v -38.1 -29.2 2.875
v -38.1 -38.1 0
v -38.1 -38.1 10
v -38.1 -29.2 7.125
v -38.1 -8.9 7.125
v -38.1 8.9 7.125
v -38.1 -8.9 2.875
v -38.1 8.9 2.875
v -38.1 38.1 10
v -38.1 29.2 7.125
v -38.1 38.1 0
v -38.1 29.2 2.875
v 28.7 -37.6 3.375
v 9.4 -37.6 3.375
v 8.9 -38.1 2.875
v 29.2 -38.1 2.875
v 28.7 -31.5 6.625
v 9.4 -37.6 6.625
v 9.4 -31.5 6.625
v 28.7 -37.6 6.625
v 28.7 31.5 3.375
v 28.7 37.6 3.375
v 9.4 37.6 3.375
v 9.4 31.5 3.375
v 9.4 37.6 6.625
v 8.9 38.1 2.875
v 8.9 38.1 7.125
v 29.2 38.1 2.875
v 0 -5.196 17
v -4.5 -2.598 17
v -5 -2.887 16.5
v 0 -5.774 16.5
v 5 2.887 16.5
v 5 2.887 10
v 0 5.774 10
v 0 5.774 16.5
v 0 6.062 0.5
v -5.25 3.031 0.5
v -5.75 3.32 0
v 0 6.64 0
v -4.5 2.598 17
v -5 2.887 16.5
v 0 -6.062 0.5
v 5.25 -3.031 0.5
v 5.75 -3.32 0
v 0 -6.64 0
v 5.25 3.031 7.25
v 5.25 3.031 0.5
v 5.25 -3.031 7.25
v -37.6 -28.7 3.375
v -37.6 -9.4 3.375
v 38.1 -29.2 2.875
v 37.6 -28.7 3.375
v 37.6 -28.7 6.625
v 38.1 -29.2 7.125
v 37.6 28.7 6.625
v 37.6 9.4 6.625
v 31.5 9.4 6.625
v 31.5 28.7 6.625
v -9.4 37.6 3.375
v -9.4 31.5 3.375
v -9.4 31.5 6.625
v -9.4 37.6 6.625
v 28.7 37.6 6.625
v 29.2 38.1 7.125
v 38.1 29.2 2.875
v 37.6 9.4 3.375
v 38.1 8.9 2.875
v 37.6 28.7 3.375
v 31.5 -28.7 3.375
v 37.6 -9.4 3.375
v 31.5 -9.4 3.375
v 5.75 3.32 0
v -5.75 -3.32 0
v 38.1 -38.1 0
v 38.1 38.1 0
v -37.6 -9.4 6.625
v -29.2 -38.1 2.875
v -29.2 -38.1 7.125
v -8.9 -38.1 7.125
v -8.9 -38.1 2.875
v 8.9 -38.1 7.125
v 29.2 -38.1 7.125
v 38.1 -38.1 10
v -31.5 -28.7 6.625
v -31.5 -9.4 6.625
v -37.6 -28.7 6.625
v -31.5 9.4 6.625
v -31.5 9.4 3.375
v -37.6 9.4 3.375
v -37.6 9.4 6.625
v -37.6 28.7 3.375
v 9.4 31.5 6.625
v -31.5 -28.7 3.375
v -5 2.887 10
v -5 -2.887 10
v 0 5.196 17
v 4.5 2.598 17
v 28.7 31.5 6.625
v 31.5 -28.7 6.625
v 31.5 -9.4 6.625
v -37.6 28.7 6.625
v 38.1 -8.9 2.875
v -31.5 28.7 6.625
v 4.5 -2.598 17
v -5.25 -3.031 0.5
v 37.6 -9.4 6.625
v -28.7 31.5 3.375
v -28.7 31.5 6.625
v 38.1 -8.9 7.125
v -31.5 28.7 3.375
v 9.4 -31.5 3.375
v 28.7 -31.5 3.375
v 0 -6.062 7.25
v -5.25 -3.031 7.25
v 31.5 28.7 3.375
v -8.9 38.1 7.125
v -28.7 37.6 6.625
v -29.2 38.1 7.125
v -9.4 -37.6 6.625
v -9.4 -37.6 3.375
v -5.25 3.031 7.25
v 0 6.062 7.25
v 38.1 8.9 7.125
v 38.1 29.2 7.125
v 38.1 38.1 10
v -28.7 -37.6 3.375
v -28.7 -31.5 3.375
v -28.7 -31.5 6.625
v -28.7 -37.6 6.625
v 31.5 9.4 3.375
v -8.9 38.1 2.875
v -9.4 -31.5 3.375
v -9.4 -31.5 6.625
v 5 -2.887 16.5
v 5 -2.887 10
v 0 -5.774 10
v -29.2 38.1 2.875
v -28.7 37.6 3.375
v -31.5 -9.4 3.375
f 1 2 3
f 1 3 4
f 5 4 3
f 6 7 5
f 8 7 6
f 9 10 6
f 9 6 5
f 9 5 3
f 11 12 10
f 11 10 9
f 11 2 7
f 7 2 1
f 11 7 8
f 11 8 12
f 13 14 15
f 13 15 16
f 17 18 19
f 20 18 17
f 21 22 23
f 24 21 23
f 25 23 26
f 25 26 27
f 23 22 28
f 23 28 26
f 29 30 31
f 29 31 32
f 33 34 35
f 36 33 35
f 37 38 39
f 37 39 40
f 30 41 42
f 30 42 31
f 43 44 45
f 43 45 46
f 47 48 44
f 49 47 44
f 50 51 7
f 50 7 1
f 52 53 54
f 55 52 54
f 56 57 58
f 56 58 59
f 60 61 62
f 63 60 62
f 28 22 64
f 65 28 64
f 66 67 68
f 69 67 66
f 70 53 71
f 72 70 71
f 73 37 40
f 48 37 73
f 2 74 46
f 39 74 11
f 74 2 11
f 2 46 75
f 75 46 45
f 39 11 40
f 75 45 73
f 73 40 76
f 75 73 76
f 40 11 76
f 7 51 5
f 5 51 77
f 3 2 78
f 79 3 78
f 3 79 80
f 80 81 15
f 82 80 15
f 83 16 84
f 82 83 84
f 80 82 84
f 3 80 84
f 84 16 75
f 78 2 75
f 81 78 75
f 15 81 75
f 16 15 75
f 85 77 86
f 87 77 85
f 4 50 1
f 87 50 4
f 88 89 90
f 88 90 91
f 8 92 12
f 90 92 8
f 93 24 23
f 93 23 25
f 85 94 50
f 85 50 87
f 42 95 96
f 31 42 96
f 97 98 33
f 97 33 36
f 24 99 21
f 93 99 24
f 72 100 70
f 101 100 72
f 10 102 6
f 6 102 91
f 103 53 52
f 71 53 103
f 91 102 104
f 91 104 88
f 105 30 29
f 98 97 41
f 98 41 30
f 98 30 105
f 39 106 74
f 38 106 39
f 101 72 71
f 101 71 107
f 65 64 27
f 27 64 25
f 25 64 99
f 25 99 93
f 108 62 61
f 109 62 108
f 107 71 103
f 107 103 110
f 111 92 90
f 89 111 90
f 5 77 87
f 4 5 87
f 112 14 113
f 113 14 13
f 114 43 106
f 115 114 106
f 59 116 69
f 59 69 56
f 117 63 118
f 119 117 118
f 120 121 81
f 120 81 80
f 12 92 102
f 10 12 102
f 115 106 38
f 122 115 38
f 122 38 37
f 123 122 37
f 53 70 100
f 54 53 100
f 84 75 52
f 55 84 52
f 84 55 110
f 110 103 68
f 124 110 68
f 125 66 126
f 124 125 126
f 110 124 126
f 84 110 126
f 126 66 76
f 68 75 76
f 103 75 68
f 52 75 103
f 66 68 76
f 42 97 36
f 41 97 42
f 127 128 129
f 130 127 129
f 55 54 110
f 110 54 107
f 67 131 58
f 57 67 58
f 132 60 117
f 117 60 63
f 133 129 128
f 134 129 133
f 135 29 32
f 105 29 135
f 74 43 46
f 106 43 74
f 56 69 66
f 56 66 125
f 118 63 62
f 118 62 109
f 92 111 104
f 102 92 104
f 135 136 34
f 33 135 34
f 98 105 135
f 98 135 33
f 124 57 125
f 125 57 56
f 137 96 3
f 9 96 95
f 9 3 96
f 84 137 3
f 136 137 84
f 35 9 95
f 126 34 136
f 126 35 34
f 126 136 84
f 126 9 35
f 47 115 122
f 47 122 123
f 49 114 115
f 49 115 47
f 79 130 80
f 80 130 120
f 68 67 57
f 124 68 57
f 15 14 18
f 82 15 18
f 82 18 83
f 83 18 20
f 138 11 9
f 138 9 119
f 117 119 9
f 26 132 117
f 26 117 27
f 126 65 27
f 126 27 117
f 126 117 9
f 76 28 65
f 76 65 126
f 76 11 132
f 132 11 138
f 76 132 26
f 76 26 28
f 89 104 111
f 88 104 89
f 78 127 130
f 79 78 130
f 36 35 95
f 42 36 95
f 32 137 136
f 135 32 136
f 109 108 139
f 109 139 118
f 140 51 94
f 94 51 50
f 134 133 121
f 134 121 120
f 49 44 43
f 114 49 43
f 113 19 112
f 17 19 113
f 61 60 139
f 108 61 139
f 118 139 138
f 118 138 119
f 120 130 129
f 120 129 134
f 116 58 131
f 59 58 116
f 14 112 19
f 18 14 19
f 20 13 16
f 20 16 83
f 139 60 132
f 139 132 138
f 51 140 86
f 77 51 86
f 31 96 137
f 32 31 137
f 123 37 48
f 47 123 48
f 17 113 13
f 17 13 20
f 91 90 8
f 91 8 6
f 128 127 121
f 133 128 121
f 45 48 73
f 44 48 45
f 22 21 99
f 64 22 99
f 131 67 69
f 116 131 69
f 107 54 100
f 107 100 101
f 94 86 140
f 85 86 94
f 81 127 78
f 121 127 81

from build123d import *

# Parameters (mm, degrees)
F0_W     = 76.2
F0_H     = 76.2
F1_DEPTH = 10
F3_DEPTH = 7
F5_DEPTH = 7.25
F6_W     = 19.3
F6_H     = 3.25
F8_DEPTH = 6.6
F9_COUNT = 4
F9_ANGLE = 270
F11_SIZE = 0.5


with BuildPart() as f1:
    # F0 (on Top) → F1 (new body)
    with BuildSketch(Plane.XY):
        Rectangle(F0_W, F0_H)
    extrude(amount=F1_DEPTH)

    # F2 (on face) → F3 (join)
    with BuildSketch(Plane.XY.offset(10)):
        Polygon((5, -2.8867513459), (5, 2.8867513459), (0, 5.7735026919), (-5, 2.8867513459), (-5, -2.8867513459), (0, -5.7735026919), align=None)
    extrude(amount=F3_DEPTH)

    # F4 (on face) → F5 (cut)
    with BuildSketch(Plane(origin=(0, 0, 0), x_dir=(1, 0, 0), z_dir=(0, 0, -1))):
        Polygon((5.25, -3.0310889132), (5.25, 3.0310889132), (0, 6.0621778265), (-5.25, 3.0310889132), (-5.25, -3.0310889132), (0, -6.0621778265), align=None)
    extrude(amount=-F5_DEPTH, mode=Mode.SUBTRACT)


with BuildPart() as f8:
    # F6 (on face) → F8 (new body)
    with BuildSketch(Plane.XZ.offset(38.1)):
        with Locations((-19.05, 5)):
            Rectangle(F6_W, F6_H)
    extrude(amount=-F8_DEPTH)


with BuildPart() as f8b:
    # F6 (on face) → F8, piece 2 (new body)
    with BuildSketch(Plane.XZ.offset(38.1)):
        with Locations((19.05, 5)):
            Rectangle(F6_W, F6_H)
    extrude(amount=-F8_DEPTH)


with BuildPart() as f9_1:
    # F9: instance of F8b
    add(f8b.part.rotate(Axis((0, 0, 20.068032667), (0, 0, -1)), 1 * F9_ANGLE / (F9_COUNT - 1)))


with BuildPart() as f9_2:
    # F9: instance of F8b
    add(f8b.part.rotate(Axis((0, 0, 20.068032667), (0, 0, -1)), 2 * F9_ANGLE / (F9_COUNT - 1)))


with BuildPart() as f9_3:
    # F9: instance of F8b
    add(f8b.part.rotate(Axis((0, 0, 20.068032667), (0, 0, -1)), 3 * F9_ANGLE / (F9_COUNT - 1)))


with BuildPart() as f9_4:
    # F9: instance of F8
    add(f8.part.rotate(Axis((0, 0, 20.068032667), (0, 0, -1)), 1 * F9_ANGLE / (F9_COUNT - 1)))


with BuildPart() as f9_5:
    # F9: instance of F8
    add(f8.part.rotate(Axis((0, 0, 20.068032667), (0, 0, -1)), 2 * F9_ANGLE / (F9_COUNT - 1)))


with BuildPart() as f9_6:
    # F9: instance of F8
    add(f8.part.rotate(Axis((0, 0, 20.068032667), (0, 0, -1)), 3 * F9_ANGLE / (F9_COUNT - 1)))


with BuildPart() as f1_1:
    add(f1.part)

    # F10: cut F9_3, F9_6, F9_2, F9_5, F9_1, F9_4, F8b, F8
    add(f9_3.part, mode=Mode.SUBTRACT)
    add(f9_6.part, mode=Mode.SUBTRACT)
    add(f9_2.part, mode=Mode.SUBTRACT)
    add(f9_5.part, mode=Mode.SUBTRACT)
    add(f9_1.part, mode=Mode.SUBTRACT)
    add(f9_4.part, mode=Mode.SUBTRACT)
    add(f8b.part, mode=Mode.SUBTRACT)
    add(f8.part, mode=Mode.SUBTRACT)

    # F11
    f11_edges = [f1_1.edges().sort_by_distance(p)[0] for p in [
        (5, 0, 17),
        (2.5, 4.330127, 17),
        (-2.5, 4.330127, 17),
        (-5, 0, 17),
        (-2.5, -4.330127, 17),
        (2.5, -4.330127, 17),
        (2.625, 4.546633, 0),
        (5.25, 0, 0),
        (2.625, -4.546633, 0),
        (-2.625, -4.546633, 0),
        (-5.25, 0, 0),
        (-2.625, 4.546633, 0),
        (38.1, -19.05, 6.625),
        (38.1, -9.4, 5),
        (38.1, -19.05, 3.375),
        (38.1, -28.7, 5),
        (38.1, 19.05, 3.375),
        (38.1, 9.4, 5),
        (38.1, 28.7, 5),
        (38.1, 19.05, 6.625),
        (19.05, 38.1, 6.625),
        (28.7, 38.1, 5),
        (9.4, 38.1, 5),
        (19.05, 38.1, 3.375),
        (28.7, -38.1, 5),
        (19.05, -38.1, 6.625),
        (9.4, -38.1, 5),
        (19.05, -38.1, 3.375),
        (-9.4, -38.1, 5),
        (-19.05, -38.1, 6.625),
        (-19.05, -38.1, 3.375),
        (-28.7, -38.1, 5),
        (-38.1, -28.7, 5),
        (-38.1, -19.05, 6.625),
        (-38.1, -9.4, 5),
        (-38.1, -19.05, 3.375),
        (-38.1, 9.4, 5),
        (-38.1, 19.05, 6.625),
        (-38.1, 28.7, 5),
        (-38.1, 19.05, 3.375),
        (-19.05, 38.1, 6.625),
        (-28.7, 38.1, 5),
        (-9.4, 38.1, 5),
        (-19.05, 38.1, 3.375),
    ]]
    chamfer(f11_edges, length=F11_SIZE)


solid = f1_1.part
